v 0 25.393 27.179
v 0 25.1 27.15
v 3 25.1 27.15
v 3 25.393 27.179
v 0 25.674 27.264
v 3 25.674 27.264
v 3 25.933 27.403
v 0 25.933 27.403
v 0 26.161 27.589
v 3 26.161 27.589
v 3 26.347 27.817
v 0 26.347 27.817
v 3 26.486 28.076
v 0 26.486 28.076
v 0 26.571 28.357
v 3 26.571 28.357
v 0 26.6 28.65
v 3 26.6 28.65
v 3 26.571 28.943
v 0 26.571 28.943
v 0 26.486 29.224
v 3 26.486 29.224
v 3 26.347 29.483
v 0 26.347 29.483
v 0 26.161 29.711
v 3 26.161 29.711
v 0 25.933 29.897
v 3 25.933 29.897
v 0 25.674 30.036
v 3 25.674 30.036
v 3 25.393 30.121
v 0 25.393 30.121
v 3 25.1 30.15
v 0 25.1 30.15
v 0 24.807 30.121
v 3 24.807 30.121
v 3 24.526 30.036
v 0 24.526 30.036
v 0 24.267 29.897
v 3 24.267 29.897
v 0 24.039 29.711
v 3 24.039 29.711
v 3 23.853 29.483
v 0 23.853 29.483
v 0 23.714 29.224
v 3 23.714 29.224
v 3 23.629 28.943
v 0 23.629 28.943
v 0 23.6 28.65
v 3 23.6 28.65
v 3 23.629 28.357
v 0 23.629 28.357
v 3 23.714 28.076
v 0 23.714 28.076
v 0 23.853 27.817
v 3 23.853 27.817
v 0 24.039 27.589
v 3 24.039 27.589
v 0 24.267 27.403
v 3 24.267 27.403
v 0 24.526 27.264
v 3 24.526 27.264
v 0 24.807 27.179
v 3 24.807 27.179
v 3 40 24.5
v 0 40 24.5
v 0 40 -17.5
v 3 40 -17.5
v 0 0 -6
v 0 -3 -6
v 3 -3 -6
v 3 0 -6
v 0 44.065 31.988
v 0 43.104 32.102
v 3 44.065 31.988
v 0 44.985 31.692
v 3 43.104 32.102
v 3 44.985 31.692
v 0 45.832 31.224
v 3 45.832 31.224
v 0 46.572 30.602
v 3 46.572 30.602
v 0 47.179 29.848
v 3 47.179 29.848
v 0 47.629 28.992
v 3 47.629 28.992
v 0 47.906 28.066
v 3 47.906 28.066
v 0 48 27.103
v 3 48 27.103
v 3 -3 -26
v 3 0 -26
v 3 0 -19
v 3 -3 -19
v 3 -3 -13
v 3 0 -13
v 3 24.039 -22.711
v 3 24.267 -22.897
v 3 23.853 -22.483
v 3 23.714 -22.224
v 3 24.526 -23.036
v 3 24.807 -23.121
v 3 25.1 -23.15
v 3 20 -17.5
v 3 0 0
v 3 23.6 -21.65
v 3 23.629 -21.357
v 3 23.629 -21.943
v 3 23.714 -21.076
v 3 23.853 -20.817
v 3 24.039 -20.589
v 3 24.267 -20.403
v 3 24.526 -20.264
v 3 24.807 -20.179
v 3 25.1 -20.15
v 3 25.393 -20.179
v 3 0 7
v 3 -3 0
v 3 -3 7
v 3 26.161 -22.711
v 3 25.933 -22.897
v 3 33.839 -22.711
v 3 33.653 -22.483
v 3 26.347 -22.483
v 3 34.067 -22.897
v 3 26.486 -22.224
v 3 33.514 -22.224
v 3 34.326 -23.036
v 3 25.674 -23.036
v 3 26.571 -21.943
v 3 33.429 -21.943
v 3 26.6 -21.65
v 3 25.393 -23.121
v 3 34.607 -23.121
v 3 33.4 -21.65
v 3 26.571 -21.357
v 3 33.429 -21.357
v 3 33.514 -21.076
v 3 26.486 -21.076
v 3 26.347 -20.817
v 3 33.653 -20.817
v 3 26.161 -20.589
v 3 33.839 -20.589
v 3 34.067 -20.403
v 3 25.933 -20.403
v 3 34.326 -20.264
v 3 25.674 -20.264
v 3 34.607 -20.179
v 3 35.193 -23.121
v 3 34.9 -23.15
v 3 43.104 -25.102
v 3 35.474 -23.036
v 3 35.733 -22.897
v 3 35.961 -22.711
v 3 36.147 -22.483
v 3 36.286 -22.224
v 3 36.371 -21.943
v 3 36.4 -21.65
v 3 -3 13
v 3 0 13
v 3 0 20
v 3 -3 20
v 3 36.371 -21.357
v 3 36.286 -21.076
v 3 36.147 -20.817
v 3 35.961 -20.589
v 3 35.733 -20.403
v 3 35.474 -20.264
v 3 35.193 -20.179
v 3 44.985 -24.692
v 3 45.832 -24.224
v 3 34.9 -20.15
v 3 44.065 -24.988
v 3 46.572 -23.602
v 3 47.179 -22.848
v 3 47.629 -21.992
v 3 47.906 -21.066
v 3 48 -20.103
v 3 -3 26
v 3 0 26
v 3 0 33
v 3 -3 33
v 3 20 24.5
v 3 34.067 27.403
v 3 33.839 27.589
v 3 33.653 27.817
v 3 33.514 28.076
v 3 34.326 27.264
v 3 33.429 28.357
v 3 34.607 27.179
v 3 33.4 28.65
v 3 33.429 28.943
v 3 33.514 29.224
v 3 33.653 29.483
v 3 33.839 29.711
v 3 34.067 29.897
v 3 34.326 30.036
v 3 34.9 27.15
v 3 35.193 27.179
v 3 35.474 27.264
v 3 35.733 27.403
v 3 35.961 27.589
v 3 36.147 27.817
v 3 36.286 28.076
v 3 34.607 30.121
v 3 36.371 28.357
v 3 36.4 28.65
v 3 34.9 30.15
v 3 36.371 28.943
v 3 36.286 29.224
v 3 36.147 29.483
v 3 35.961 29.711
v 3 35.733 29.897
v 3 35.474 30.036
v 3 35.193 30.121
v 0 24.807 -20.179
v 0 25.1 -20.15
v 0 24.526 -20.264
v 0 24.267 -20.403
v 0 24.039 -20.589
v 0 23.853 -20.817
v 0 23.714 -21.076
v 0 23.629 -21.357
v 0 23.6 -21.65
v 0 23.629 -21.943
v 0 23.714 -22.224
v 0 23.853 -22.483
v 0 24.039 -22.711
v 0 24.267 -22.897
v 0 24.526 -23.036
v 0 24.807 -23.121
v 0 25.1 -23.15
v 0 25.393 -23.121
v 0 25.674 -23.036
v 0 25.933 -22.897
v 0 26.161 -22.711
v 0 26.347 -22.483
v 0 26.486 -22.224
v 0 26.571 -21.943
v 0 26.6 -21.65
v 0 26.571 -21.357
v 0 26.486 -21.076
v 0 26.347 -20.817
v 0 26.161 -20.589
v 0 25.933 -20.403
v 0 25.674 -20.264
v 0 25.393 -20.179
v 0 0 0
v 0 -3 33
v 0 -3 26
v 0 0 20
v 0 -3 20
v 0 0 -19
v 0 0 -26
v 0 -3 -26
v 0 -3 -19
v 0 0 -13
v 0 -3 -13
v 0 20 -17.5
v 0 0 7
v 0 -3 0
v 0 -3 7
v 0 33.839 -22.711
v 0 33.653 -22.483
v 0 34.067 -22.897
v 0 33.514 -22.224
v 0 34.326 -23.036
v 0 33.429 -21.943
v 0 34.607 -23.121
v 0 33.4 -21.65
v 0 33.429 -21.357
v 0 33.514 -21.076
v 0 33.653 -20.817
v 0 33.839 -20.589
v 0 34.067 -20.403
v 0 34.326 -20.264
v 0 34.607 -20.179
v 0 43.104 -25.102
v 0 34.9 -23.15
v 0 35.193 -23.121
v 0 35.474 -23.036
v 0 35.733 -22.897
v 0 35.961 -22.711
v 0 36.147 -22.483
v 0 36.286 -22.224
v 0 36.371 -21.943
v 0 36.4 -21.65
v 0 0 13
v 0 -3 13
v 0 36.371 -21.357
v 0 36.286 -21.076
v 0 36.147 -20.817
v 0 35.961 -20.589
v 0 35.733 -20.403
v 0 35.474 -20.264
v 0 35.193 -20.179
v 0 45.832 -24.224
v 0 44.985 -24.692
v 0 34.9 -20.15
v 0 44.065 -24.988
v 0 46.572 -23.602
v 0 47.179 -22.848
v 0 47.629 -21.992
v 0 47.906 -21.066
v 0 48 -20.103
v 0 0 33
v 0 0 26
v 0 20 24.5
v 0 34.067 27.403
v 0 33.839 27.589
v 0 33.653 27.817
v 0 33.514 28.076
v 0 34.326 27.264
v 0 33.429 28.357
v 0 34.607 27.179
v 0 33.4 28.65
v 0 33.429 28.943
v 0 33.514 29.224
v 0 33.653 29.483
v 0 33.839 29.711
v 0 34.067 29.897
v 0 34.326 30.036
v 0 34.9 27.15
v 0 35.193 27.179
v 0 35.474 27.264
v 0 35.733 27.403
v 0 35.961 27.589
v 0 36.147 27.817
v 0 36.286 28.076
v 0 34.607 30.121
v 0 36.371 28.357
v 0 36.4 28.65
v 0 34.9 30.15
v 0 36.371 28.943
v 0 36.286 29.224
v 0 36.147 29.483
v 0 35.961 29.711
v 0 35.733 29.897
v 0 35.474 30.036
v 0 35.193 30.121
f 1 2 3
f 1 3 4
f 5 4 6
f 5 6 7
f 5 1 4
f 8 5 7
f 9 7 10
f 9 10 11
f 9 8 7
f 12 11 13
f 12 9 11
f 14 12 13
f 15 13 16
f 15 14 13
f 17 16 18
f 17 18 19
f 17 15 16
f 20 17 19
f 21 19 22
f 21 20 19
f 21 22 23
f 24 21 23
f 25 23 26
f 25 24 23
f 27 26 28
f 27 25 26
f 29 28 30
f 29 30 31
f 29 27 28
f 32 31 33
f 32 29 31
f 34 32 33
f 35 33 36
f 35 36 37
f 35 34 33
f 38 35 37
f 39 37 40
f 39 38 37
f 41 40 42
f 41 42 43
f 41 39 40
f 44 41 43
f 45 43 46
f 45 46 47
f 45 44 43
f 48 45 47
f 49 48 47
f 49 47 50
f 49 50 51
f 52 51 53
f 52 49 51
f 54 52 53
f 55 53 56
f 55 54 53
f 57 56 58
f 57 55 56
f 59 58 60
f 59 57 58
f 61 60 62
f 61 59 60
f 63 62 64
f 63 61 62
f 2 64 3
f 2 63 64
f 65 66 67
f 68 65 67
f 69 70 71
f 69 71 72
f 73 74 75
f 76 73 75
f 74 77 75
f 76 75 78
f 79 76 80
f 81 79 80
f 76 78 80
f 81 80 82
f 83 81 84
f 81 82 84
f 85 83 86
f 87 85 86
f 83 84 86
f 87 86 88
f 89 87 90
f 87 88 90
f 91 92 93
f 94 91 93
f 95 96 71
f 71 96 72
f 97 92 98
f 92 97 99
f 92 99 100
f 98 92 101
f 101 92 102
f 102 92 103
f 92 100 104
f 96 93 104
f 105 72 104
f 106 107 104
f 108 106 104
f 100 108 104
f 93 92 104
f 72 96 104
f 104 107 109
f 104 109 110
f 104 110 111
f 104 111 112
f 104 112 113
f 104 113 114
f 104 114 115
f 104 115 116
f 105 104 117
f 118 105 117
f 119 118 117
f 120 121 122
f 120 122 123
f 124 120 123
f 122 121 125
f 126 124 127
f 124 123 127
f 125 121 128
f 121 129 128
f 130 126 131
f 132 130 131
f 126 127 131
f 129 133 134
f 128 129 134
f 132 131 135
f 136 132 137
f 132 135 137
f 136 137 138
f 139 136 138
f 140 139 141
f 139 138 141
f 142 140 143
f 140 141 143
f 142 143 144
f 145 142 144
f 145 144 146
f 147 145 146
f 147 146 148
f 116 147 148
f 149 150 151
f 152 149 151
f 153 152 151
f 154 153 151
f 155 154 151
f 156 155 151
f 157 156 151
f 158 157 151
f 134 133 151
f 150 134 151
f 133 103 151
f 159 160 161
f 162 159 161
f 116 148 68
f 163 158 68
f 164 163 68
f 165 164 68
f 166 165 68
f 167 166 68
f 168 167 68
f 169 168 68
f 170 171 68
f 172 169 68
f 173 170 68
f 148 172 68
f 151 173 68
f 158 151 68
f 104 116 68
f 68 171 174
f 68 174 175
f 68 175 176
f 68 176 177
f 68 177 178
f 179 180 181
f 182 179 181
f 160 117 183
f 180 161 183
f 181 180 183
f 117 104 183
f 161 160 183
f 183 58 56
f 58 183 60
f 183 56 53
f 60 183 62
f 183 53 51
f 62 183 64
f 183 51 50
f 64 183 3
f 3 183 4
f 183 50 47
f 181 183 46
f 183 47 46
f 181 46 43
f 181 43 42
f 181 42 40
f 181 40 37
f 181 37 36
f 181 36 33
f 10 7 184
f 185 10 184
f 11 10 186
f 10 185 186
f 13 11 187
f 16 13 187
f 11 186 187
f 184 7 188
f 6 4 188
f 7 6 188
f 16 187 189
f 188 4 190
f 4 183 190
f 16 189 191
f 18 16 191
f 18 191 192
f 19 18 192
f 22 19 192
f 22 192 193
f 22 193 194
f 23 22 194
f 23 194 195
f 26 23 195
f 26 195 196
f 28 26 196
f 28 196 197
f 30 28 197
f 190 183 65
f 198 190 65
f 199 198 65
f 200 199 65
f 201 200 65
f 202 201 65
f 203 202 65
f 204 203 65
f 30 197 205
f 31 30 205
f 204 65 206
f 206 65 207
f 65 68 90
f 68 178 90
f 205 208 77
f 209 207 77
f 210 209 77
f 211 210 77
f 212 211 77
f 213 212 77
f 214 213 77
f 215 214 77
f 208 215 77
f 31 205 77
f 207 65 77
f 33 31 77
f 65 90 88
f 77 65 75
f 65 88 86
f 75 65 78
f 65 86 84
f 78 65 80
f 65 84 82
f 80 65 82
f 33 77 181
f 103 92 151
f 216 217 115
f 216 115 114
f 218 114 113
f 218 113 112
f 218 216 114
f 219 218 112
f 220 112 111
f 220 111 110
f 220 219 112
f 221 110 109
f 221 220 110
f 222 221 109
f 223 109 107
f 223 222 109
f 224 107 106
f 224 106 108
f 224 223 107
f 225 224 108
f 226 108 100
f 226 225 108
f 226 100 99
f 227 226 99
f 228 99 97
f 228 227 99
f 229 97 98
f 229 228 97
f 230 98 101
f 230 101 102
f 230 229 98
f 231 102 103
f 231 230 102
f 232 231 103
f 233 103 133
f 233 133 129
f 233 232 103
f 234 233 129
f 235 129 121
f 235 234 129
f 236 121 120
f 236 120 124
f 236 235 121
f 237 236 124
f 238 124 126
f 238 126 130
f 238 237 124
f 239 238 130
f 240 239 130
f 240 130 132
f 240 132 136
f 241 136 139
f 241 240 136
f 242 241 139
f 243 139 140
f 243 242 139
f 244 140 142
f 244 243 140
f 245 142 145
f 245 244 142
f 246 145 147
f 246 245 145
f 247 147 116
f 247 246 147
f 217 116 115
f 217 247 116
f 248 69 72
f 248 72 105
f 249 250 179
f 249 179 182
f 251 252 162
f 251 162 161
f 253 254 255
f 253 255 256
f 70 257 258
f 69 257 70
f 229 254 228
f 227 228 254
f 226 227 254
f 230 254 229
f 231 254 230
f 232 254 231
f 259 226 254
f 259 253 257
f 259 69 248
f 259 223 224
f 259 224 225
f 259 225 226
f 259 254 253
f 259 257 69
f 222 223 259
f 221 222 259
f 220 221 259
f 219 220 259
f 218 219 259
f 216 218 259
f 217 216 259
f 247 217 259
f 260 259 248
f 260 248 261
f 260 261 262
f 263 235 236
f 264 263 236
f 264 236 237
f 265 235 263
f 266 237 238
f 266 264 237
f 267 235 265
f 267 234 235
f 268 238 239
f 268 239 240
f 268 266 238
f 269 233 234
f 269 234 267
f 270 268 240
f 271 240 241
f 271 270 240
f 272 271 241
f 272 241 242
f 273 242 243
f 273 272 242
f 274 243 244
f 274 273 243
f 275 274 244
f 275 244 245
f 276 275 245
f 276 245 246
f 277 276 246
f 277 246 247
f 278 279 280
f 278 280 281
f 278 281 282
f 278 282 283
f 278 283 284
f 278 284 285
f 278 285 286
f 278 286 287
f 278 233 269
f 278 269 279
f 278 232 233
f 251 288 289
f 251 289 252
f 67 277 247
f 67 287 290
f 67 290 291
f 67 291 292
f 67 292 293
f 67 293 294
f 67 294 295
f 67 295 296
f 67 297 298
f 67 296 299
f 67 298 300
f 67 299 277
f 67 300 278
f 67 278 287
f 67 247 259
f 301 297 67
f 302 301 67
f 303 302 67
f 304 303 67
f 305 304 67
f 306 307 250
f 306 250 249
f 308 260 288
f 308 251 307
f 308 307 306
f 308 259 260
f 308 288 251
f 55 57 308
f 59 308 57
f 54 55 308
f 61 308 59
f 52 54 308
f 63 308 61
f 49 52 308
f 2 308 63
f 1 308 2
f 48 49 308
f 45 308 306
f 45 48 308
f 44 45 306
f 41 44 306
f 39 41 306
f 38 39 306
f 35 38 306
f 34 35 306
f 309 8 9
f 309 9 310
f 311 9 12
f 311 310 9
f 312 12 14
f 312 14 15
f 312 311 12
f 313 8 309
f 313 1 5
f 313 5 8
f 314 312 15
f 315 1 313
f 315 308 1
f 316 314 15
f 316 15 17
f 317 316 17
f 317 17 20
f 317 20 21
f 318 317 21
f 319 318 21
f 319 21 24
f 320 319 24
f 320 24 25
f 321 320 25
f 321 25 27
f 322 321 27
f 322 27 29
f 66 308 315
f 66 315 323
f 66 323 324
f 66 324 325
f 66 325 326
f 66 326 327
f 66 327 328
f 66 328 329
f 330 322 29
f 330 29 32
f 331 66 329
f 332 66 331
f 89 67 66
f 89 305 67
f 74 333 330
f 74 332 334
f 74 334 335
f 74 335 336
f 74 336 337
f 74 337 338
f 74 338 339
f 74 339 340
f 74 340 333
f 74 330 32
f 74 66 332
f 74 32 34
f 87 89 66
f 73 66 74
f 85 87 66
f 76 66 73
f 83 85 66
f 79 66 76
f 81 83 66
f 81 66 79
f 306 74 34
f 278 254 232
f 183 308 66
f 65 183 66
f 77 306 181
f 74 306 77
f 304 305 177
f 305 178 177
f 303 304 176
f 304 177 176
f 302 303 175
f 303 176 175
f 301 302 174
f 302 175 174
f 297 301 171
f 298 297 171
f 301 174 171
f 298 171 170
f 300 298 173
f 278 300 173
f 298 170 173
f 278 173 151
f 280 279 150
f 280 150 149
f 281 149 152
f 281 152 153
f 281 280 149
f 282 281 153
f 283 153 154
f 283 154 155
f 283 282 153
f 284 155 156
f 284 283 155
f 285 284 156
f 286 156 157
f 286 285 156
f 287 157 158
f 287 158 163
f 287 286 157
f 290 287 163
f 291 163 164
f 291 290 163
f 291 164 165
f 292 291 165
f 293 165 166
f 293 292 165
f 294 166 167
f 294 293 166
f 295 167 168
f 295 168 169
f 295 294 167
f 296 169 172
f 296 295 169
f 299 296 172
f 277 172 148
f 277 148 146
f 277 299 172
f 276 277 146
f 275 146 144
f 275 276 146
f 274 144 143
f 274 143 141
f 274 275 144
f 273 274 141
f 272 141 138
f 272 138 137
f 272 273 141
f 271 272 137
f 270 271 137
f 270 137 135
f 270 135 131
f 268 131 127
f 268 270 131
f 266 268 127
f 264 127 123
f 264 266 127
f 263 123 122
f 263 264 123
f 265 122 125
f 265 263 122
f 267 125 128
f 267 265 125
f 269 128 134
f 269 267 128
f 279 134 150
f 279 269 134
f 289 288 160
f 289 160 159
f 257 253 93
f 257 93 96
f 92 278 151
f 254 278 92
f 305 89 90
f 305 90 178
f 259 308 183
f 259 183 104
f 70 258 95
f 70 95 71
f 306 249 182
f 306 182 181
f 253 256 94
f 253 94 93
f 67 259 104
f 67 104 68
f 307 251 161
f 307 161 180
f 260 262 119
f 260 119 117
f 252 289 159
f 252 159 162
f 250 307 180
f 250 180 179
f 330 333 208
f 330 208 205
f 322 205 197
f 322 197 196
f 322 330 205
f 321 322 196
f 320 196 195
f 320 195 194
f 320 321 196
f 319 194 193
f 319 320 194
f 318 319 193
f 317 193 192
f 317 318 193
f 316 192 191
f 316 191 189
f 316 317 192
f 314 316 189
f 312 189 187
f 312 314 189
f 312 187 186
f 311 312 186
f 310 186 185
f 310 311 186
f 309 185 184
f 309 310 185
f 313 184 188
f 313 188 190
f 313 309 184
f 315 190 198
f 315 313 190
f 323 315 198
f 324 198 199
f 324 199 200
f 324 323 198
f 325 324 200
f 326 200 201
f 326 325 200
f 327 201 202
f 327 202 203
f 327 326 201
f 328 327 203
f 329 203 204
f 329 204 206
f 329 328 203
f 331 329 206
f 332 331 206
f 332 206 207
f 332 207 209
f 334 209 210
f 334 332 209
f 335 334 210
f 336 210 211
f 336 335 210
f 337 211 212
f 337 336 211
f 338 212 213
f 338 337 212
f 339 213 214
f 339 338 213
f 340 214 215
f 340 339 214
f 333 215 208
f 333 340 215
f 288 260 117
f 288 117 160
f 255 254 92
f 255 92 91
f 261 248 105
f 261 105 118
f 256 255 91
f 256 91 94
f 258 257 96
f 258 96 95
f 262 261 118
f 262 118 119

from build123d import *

# Parameters (mm, degrees)
SKETCH1_R           = 1.5
SKETCH1_W           = 42
SKETCH1_H           = 20
BOSS_EXTRUDE1_DEPTH = 3
FILLET1_R           = 5


with BuildPart() as part:
    # Sketch1 → Boss-Extrude1 (new body)
    with BuildSketch(Plane(origin=(0, 0, 0), x_dir=(0, 0, -1), z_dir=(1, 0, 0))):
        Polygon((-33, 0), (-32, 48), (25, 48), (26, 0), (26, -3), (19, -3), (19, 0), (13, 0), (13, -3), (6, -3), (6, 0), (0, 0), (0, -3), (-7, -3), (-7, 0), (-13, 0), (-13, -3), (-20, -3), (-20, 0), (-26, 0), (-26, -3), (-33, -3), align=None)
        with Locations((21.65, 34.9)):
            Circle(SKETCH1_R, mode=Mode.SUBTRACT)
        with Locations(Location((21.65, 25.1, 0), (0, 0, 180))):
            Circle(SKETCH1_R, mode=Mode.SUBTRACT)
        with Locations(Location((-28.65, 34.9, 0), (0, 0, 180))):
            Circle(SKETCH1_R, mode=Mode.SUBTRACT)
        with Locations((-28.65, 25.1)):
            Circle(SKETCH1_R, mode=Mode.SUBTRACT)
        with Locations((-3.5, 30)):
            Rectangle(SKETCH1_W, SKETCH1_H, mode=Mode.SUBTRACT)
    extrude(amount=BOSS_EXTRUDE1_DEPTH)

    # Fillet1
    fillet1_edges = [part.edges().sort_by_distance(p)[0] for p in [
        (1.5, 48, 32),
        (1.5, 48, -25),
    ]]
    fillet(fillet1_edges, radius=FILLET1_R)


solid = part.part
